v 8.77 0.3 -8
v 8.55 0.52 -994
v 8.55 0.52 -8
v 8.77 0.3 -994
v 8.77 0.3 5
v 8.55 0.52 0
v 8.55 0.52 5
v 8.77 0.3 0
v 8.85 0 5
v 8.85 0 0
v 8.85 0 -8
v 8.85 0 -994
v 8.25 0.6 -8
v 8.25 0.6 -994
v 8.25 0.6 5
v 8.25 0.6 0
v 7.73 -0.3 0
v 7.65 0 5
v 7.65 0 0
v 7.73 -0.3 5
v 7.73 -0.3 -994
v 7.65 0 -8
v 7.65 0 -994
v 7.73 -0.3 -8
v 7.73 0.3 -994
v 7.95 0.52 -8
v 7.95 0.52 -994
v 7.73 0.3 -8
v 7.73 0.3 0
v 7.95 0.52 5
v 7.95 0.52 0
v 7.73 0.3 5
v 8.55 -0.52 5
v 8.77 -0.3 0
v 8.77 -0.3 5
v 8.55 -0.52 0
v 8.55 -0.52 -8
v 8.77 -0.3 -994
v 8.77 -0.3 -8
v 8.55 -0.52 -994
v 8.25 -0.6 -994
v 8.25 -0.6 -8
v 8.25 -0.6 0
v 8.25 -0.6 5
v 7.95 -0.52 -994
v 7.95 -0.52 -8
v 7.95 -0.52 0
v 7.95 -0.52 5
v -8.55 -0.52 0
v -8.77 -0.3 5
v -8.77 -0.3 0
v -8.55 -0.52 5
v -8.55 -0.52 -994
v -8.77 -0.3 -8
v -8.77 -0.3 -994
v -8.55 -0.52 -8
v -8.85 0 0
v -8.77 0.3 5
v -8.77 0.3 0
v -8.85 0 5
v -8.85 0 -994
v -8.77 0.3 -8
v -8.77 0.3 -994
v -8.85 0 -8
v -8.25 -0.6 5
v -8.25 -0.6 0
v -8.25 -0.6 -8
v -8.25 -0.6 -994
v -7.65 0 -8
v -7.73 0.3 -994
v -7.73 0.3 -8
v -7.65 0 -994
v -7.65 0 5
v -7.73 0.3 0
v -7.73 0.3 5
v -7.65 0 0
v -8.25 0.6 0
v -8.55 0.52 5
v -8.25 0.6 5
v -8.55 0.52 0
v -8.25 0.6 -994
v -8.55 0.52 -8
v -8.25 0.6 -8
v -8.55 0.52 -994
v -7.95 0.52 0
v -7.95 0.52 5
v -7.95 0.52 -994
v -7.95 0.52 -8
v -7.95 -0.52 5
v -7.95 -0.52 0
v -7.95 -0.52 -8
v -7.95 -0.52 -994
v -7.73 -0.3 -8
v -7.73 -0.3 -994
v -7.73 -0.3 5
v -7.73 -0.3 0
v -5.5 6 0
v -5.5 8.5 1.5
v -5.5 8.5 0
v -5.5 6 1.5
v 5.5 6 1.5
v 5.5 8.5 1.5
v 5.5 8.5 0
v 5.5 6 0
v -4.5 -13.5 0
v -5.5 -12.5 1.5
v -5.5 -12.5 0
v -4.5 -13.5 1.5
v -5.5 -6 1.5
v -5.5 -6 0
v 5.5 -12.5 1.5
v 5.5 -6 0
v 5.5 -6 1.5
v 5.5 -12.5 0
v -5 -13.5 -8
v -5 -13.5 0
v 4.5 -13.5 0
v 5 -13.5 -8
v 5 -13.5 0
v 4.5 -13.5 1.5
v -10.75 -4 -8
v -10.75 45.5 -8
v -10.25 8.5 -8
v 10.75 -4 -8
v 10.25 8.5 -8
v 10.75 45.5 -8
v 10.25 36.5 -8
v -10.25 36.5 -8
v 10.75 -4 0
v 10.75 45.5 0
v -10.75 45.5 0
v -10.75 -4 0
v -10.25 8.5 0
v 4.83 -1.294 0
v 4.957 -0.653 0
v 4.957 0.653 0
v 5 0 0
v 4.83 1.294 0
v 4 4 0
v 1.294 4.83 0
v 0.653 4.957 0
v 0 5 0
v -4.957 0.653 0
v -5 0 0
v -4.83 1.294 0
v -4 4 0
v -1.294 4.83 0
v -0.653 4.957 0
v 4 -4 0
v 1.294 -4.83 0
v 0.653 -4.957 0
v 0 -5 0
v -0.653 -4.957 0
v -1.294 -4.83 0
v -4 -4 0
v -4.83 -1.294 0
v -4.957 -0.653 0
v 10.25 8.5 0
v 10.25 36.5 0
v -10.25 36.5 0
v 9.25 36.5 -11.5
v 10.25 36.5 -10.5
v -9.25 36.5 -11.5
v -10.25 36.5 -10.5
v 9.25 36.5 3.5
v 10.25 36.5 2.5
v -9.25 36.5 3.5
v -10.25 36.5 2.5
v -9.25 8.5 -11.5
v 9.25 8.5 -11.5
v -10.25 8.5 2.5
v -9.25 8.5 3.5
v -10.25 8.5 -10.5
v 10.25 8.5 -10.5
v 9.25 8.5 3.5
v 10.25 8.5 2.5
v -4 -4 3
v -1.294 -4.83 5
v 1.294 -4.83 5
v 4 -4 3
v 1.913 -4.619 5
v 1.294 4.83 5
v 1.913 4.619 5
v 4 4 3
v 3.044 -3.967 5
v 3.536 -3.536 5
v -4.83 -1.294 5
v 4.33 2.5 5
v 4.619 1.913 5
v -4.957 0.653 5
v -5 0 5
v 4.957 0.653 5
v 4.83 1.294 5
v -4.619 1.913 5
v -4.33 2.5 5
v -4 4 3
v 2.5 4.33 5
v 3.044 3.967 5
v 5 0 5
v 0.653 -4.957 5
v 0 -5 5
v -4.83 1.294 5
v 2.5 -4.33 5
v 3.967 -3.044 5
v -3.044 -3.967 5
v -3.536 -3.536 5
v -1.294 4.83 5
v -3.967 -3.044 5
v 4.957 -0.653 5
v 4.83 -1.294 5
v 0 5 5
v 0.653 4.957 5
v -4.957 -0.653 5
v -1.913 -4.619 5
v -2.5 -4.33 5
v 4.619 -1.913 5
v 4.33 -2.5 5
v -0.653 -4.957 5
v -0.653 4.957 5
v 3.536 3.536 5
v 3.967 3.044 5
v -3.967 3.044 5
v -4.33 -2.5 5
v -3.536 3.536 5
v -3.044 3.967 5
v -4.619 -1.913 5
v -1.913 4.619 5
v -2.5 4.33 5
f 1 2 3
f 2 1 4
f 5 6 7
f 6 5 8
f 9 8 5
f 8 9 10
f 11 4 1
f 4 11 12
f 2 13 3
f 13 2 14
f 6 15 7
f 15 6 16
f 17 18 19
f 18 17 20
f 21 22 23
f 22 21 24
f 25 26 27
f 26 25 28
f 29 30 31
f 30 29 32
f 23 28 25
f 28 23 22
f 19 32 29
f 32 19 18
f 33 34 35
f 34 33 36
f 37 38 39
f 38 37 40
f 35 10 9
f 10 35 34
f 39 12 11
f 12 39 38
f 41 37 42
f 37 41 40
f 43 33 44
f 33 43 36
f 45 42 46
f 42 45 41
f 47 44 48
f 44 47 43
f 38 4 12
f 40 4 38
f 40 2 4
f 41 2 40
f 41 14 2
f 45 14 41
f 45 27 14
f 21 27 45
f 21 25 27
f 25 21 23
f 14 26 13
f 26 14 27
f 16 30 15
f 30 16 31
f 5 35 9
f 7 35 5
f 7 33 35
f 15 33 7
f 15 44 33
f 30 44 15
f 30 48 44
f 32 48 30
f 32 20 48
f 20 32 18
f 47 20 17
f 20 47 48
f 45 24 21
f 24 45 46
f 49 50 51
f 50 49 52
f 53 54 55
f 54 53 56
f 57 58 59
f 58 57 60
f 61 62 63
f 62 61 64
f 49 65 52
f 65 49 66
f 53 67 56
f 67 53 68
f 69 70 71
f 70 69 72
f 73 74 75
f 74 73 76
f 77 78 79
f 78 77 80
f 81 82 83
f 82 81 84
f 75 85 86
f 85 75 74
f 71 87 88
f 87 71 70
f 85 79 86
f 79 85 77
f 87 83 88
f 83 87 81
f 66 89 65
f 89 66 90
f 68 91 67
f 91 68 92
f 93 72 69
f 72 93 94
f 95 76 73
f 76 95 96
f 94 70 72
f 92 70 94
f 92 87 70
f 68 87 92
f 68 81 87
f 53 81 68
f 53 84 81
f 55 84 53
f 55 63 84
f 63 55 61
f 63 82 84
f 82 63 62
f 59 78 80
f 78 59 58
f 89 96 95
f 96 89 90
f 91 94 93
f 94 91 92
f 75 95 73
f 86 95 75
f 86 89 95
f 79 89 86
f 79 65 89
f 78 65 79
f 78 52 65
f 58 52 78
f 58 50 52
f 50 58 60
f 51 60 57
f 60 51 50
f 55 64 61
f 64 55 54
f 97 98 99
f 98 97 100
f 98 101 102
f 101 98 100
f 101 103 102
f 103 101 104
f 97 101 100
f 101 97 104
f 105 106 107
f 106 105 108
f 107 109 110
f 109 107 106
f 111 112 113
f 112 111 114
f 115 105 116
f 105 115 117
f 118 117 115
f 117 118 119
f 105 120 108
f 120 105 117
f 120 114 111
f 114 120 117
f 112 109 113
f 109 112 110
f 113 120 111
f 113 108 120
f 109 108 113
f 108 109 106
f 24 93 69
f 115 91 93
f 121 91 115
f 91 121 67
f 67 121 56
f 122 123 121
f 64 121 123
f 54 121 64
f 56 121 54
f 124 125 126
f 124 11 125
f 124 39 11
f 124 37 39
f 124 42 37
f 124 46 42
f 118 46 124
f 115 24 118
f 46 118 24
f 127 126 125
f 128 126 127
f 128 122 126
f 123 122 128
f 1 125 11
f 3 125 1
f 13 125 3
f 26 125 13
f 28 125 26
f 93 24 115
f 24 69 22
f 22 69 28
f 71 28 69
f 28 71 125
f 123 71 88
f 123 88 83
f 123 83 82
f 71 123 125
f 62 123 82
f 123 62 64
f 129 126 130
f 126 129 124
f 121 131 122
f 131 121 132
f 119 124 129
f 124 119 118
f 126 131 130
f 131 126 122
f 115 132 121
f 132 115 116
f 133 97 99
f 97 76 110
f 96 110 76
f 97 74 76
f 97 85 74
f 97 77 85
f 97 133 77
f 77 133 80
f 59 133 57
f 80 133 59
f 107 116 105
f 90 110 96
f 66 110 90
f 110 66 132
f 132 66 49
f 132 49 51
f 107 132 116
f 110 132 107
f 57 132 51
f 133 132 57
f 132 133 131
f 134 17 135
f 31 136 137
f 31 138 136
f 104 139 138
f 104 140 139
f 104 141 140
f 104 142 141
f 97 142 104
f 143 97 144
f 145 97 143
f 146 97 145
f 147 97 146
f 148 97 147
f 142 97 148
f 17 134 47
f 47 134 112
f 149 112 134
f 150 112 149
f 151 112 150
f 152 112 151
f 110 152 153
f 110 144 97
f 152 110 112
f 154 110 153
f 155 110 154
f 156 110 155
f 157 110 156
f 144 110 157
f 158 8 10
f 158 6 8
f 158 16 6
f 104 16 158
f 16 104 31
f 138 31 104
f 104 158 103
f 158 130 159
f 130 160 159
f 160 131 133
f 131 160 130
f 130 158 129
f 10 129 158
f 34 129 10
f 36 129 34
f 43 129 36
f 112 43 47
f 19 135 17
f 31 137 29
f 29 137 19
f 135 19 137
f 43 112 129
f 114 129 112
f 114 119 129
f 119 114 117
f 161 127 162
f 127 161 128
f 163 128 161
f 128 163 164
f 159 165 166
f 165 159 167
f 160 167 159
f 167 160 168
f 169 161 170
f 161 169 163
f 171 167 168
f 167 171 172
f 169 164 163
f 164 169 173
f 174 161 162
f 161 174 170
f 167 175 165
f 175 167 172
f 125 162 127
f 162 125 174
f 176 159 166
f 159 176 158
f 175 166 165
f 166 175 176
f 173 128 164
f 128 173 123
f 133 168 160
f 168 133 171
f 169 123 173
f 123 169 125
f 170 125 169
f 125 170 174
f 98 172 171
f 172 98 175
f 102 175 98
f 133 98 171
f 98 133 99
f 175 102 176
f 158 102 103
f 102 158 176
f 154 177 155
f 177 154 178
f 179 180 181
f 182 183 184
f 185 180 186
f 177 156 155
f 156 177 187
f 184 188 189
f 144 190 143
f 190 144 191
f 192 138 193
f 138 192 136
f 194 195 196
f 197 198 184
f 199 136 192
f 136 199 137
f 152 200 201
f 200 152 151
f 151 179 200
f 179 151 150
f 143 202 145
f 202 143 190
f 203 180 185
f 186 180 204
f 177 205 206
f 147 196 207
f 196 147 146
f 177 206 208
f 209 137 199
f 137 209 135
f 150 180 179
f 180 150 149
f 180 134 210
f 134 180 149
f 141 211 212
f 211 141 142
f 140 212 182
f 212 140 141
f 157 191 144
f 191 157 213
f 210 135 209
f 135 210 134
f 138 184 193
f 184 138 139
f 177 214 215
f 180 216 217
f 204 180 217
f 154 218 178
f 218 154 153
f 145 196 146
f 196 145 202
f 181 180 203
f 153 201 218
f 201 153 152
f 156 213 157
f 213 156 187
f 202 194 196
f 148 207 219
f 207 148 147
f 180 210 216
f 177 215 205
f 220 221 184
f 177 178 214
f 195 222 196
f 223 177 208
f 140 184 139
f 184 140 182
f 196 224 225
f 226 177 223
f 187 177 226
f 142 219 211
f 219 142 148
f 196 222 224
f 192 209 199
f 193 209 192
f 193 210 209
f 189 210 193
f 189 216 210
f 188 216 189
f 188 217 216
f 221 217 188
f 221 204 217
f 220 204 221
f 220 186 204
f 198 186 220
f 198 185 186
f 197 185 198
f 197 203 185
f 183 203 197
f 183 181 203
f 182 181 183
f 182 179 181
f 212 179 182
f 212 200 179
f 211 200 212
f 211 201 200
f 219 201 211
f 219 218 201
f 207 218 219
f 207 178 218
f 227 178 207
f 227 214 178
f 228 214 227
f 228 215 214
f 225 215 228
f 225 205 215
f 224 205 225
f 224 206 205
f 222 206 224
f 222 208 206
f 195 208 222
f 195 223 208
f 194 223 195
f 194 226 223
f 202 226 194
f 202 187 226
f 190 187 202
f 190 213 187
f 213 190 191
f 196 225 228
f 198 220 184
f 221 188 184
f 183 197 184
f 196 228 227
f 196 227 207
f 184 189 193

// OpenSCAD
use <utilities.scad>;



$fn=48;
d=0.05;

module C270(beam_r=5, beam_h=5){
    //cut-out to fit logitech C270 webcam
    //optical axis at (0,0)
    //top of PCB at (0,0,0)
    camera_h=0;
    mounting_hole_x = 8.25;
    mirror([0,0,1]){
        //beam clearance
        hull(){
            cube([8,8,6],center=true);
            cylinder(r=beam_r,h=2*beam_h,center=true);
        }

        //mounting holes
        reflect([1,0,0]) translate([mounting_hole_x,0,-5]) cylinder(r=0.6,h=999,$fn=12); 
        
        //clearance for PCB
        translate([0,0,0]){
            hull(){
                translate([-10/2,-13.5,0]) cube([10,d,8]);
                translate([-21.5/2,-4,0]) cube([21.5,49.5,8]);
            }
            reflect([0,1,0]) hull(){
                translate([-4.5,6,-1.5]) cube([9,7.5,8]);
                translate([-5.5,6,-1.5]) cube([11,6.5,8]);
            }
            hull(){
                translate([0,22.5,4]) cube([20.5,28,13],center=true);
                translate([0,22.5,4]) cube([18.5,28,15],center=true);
            }
        }
    }
}

C270();
